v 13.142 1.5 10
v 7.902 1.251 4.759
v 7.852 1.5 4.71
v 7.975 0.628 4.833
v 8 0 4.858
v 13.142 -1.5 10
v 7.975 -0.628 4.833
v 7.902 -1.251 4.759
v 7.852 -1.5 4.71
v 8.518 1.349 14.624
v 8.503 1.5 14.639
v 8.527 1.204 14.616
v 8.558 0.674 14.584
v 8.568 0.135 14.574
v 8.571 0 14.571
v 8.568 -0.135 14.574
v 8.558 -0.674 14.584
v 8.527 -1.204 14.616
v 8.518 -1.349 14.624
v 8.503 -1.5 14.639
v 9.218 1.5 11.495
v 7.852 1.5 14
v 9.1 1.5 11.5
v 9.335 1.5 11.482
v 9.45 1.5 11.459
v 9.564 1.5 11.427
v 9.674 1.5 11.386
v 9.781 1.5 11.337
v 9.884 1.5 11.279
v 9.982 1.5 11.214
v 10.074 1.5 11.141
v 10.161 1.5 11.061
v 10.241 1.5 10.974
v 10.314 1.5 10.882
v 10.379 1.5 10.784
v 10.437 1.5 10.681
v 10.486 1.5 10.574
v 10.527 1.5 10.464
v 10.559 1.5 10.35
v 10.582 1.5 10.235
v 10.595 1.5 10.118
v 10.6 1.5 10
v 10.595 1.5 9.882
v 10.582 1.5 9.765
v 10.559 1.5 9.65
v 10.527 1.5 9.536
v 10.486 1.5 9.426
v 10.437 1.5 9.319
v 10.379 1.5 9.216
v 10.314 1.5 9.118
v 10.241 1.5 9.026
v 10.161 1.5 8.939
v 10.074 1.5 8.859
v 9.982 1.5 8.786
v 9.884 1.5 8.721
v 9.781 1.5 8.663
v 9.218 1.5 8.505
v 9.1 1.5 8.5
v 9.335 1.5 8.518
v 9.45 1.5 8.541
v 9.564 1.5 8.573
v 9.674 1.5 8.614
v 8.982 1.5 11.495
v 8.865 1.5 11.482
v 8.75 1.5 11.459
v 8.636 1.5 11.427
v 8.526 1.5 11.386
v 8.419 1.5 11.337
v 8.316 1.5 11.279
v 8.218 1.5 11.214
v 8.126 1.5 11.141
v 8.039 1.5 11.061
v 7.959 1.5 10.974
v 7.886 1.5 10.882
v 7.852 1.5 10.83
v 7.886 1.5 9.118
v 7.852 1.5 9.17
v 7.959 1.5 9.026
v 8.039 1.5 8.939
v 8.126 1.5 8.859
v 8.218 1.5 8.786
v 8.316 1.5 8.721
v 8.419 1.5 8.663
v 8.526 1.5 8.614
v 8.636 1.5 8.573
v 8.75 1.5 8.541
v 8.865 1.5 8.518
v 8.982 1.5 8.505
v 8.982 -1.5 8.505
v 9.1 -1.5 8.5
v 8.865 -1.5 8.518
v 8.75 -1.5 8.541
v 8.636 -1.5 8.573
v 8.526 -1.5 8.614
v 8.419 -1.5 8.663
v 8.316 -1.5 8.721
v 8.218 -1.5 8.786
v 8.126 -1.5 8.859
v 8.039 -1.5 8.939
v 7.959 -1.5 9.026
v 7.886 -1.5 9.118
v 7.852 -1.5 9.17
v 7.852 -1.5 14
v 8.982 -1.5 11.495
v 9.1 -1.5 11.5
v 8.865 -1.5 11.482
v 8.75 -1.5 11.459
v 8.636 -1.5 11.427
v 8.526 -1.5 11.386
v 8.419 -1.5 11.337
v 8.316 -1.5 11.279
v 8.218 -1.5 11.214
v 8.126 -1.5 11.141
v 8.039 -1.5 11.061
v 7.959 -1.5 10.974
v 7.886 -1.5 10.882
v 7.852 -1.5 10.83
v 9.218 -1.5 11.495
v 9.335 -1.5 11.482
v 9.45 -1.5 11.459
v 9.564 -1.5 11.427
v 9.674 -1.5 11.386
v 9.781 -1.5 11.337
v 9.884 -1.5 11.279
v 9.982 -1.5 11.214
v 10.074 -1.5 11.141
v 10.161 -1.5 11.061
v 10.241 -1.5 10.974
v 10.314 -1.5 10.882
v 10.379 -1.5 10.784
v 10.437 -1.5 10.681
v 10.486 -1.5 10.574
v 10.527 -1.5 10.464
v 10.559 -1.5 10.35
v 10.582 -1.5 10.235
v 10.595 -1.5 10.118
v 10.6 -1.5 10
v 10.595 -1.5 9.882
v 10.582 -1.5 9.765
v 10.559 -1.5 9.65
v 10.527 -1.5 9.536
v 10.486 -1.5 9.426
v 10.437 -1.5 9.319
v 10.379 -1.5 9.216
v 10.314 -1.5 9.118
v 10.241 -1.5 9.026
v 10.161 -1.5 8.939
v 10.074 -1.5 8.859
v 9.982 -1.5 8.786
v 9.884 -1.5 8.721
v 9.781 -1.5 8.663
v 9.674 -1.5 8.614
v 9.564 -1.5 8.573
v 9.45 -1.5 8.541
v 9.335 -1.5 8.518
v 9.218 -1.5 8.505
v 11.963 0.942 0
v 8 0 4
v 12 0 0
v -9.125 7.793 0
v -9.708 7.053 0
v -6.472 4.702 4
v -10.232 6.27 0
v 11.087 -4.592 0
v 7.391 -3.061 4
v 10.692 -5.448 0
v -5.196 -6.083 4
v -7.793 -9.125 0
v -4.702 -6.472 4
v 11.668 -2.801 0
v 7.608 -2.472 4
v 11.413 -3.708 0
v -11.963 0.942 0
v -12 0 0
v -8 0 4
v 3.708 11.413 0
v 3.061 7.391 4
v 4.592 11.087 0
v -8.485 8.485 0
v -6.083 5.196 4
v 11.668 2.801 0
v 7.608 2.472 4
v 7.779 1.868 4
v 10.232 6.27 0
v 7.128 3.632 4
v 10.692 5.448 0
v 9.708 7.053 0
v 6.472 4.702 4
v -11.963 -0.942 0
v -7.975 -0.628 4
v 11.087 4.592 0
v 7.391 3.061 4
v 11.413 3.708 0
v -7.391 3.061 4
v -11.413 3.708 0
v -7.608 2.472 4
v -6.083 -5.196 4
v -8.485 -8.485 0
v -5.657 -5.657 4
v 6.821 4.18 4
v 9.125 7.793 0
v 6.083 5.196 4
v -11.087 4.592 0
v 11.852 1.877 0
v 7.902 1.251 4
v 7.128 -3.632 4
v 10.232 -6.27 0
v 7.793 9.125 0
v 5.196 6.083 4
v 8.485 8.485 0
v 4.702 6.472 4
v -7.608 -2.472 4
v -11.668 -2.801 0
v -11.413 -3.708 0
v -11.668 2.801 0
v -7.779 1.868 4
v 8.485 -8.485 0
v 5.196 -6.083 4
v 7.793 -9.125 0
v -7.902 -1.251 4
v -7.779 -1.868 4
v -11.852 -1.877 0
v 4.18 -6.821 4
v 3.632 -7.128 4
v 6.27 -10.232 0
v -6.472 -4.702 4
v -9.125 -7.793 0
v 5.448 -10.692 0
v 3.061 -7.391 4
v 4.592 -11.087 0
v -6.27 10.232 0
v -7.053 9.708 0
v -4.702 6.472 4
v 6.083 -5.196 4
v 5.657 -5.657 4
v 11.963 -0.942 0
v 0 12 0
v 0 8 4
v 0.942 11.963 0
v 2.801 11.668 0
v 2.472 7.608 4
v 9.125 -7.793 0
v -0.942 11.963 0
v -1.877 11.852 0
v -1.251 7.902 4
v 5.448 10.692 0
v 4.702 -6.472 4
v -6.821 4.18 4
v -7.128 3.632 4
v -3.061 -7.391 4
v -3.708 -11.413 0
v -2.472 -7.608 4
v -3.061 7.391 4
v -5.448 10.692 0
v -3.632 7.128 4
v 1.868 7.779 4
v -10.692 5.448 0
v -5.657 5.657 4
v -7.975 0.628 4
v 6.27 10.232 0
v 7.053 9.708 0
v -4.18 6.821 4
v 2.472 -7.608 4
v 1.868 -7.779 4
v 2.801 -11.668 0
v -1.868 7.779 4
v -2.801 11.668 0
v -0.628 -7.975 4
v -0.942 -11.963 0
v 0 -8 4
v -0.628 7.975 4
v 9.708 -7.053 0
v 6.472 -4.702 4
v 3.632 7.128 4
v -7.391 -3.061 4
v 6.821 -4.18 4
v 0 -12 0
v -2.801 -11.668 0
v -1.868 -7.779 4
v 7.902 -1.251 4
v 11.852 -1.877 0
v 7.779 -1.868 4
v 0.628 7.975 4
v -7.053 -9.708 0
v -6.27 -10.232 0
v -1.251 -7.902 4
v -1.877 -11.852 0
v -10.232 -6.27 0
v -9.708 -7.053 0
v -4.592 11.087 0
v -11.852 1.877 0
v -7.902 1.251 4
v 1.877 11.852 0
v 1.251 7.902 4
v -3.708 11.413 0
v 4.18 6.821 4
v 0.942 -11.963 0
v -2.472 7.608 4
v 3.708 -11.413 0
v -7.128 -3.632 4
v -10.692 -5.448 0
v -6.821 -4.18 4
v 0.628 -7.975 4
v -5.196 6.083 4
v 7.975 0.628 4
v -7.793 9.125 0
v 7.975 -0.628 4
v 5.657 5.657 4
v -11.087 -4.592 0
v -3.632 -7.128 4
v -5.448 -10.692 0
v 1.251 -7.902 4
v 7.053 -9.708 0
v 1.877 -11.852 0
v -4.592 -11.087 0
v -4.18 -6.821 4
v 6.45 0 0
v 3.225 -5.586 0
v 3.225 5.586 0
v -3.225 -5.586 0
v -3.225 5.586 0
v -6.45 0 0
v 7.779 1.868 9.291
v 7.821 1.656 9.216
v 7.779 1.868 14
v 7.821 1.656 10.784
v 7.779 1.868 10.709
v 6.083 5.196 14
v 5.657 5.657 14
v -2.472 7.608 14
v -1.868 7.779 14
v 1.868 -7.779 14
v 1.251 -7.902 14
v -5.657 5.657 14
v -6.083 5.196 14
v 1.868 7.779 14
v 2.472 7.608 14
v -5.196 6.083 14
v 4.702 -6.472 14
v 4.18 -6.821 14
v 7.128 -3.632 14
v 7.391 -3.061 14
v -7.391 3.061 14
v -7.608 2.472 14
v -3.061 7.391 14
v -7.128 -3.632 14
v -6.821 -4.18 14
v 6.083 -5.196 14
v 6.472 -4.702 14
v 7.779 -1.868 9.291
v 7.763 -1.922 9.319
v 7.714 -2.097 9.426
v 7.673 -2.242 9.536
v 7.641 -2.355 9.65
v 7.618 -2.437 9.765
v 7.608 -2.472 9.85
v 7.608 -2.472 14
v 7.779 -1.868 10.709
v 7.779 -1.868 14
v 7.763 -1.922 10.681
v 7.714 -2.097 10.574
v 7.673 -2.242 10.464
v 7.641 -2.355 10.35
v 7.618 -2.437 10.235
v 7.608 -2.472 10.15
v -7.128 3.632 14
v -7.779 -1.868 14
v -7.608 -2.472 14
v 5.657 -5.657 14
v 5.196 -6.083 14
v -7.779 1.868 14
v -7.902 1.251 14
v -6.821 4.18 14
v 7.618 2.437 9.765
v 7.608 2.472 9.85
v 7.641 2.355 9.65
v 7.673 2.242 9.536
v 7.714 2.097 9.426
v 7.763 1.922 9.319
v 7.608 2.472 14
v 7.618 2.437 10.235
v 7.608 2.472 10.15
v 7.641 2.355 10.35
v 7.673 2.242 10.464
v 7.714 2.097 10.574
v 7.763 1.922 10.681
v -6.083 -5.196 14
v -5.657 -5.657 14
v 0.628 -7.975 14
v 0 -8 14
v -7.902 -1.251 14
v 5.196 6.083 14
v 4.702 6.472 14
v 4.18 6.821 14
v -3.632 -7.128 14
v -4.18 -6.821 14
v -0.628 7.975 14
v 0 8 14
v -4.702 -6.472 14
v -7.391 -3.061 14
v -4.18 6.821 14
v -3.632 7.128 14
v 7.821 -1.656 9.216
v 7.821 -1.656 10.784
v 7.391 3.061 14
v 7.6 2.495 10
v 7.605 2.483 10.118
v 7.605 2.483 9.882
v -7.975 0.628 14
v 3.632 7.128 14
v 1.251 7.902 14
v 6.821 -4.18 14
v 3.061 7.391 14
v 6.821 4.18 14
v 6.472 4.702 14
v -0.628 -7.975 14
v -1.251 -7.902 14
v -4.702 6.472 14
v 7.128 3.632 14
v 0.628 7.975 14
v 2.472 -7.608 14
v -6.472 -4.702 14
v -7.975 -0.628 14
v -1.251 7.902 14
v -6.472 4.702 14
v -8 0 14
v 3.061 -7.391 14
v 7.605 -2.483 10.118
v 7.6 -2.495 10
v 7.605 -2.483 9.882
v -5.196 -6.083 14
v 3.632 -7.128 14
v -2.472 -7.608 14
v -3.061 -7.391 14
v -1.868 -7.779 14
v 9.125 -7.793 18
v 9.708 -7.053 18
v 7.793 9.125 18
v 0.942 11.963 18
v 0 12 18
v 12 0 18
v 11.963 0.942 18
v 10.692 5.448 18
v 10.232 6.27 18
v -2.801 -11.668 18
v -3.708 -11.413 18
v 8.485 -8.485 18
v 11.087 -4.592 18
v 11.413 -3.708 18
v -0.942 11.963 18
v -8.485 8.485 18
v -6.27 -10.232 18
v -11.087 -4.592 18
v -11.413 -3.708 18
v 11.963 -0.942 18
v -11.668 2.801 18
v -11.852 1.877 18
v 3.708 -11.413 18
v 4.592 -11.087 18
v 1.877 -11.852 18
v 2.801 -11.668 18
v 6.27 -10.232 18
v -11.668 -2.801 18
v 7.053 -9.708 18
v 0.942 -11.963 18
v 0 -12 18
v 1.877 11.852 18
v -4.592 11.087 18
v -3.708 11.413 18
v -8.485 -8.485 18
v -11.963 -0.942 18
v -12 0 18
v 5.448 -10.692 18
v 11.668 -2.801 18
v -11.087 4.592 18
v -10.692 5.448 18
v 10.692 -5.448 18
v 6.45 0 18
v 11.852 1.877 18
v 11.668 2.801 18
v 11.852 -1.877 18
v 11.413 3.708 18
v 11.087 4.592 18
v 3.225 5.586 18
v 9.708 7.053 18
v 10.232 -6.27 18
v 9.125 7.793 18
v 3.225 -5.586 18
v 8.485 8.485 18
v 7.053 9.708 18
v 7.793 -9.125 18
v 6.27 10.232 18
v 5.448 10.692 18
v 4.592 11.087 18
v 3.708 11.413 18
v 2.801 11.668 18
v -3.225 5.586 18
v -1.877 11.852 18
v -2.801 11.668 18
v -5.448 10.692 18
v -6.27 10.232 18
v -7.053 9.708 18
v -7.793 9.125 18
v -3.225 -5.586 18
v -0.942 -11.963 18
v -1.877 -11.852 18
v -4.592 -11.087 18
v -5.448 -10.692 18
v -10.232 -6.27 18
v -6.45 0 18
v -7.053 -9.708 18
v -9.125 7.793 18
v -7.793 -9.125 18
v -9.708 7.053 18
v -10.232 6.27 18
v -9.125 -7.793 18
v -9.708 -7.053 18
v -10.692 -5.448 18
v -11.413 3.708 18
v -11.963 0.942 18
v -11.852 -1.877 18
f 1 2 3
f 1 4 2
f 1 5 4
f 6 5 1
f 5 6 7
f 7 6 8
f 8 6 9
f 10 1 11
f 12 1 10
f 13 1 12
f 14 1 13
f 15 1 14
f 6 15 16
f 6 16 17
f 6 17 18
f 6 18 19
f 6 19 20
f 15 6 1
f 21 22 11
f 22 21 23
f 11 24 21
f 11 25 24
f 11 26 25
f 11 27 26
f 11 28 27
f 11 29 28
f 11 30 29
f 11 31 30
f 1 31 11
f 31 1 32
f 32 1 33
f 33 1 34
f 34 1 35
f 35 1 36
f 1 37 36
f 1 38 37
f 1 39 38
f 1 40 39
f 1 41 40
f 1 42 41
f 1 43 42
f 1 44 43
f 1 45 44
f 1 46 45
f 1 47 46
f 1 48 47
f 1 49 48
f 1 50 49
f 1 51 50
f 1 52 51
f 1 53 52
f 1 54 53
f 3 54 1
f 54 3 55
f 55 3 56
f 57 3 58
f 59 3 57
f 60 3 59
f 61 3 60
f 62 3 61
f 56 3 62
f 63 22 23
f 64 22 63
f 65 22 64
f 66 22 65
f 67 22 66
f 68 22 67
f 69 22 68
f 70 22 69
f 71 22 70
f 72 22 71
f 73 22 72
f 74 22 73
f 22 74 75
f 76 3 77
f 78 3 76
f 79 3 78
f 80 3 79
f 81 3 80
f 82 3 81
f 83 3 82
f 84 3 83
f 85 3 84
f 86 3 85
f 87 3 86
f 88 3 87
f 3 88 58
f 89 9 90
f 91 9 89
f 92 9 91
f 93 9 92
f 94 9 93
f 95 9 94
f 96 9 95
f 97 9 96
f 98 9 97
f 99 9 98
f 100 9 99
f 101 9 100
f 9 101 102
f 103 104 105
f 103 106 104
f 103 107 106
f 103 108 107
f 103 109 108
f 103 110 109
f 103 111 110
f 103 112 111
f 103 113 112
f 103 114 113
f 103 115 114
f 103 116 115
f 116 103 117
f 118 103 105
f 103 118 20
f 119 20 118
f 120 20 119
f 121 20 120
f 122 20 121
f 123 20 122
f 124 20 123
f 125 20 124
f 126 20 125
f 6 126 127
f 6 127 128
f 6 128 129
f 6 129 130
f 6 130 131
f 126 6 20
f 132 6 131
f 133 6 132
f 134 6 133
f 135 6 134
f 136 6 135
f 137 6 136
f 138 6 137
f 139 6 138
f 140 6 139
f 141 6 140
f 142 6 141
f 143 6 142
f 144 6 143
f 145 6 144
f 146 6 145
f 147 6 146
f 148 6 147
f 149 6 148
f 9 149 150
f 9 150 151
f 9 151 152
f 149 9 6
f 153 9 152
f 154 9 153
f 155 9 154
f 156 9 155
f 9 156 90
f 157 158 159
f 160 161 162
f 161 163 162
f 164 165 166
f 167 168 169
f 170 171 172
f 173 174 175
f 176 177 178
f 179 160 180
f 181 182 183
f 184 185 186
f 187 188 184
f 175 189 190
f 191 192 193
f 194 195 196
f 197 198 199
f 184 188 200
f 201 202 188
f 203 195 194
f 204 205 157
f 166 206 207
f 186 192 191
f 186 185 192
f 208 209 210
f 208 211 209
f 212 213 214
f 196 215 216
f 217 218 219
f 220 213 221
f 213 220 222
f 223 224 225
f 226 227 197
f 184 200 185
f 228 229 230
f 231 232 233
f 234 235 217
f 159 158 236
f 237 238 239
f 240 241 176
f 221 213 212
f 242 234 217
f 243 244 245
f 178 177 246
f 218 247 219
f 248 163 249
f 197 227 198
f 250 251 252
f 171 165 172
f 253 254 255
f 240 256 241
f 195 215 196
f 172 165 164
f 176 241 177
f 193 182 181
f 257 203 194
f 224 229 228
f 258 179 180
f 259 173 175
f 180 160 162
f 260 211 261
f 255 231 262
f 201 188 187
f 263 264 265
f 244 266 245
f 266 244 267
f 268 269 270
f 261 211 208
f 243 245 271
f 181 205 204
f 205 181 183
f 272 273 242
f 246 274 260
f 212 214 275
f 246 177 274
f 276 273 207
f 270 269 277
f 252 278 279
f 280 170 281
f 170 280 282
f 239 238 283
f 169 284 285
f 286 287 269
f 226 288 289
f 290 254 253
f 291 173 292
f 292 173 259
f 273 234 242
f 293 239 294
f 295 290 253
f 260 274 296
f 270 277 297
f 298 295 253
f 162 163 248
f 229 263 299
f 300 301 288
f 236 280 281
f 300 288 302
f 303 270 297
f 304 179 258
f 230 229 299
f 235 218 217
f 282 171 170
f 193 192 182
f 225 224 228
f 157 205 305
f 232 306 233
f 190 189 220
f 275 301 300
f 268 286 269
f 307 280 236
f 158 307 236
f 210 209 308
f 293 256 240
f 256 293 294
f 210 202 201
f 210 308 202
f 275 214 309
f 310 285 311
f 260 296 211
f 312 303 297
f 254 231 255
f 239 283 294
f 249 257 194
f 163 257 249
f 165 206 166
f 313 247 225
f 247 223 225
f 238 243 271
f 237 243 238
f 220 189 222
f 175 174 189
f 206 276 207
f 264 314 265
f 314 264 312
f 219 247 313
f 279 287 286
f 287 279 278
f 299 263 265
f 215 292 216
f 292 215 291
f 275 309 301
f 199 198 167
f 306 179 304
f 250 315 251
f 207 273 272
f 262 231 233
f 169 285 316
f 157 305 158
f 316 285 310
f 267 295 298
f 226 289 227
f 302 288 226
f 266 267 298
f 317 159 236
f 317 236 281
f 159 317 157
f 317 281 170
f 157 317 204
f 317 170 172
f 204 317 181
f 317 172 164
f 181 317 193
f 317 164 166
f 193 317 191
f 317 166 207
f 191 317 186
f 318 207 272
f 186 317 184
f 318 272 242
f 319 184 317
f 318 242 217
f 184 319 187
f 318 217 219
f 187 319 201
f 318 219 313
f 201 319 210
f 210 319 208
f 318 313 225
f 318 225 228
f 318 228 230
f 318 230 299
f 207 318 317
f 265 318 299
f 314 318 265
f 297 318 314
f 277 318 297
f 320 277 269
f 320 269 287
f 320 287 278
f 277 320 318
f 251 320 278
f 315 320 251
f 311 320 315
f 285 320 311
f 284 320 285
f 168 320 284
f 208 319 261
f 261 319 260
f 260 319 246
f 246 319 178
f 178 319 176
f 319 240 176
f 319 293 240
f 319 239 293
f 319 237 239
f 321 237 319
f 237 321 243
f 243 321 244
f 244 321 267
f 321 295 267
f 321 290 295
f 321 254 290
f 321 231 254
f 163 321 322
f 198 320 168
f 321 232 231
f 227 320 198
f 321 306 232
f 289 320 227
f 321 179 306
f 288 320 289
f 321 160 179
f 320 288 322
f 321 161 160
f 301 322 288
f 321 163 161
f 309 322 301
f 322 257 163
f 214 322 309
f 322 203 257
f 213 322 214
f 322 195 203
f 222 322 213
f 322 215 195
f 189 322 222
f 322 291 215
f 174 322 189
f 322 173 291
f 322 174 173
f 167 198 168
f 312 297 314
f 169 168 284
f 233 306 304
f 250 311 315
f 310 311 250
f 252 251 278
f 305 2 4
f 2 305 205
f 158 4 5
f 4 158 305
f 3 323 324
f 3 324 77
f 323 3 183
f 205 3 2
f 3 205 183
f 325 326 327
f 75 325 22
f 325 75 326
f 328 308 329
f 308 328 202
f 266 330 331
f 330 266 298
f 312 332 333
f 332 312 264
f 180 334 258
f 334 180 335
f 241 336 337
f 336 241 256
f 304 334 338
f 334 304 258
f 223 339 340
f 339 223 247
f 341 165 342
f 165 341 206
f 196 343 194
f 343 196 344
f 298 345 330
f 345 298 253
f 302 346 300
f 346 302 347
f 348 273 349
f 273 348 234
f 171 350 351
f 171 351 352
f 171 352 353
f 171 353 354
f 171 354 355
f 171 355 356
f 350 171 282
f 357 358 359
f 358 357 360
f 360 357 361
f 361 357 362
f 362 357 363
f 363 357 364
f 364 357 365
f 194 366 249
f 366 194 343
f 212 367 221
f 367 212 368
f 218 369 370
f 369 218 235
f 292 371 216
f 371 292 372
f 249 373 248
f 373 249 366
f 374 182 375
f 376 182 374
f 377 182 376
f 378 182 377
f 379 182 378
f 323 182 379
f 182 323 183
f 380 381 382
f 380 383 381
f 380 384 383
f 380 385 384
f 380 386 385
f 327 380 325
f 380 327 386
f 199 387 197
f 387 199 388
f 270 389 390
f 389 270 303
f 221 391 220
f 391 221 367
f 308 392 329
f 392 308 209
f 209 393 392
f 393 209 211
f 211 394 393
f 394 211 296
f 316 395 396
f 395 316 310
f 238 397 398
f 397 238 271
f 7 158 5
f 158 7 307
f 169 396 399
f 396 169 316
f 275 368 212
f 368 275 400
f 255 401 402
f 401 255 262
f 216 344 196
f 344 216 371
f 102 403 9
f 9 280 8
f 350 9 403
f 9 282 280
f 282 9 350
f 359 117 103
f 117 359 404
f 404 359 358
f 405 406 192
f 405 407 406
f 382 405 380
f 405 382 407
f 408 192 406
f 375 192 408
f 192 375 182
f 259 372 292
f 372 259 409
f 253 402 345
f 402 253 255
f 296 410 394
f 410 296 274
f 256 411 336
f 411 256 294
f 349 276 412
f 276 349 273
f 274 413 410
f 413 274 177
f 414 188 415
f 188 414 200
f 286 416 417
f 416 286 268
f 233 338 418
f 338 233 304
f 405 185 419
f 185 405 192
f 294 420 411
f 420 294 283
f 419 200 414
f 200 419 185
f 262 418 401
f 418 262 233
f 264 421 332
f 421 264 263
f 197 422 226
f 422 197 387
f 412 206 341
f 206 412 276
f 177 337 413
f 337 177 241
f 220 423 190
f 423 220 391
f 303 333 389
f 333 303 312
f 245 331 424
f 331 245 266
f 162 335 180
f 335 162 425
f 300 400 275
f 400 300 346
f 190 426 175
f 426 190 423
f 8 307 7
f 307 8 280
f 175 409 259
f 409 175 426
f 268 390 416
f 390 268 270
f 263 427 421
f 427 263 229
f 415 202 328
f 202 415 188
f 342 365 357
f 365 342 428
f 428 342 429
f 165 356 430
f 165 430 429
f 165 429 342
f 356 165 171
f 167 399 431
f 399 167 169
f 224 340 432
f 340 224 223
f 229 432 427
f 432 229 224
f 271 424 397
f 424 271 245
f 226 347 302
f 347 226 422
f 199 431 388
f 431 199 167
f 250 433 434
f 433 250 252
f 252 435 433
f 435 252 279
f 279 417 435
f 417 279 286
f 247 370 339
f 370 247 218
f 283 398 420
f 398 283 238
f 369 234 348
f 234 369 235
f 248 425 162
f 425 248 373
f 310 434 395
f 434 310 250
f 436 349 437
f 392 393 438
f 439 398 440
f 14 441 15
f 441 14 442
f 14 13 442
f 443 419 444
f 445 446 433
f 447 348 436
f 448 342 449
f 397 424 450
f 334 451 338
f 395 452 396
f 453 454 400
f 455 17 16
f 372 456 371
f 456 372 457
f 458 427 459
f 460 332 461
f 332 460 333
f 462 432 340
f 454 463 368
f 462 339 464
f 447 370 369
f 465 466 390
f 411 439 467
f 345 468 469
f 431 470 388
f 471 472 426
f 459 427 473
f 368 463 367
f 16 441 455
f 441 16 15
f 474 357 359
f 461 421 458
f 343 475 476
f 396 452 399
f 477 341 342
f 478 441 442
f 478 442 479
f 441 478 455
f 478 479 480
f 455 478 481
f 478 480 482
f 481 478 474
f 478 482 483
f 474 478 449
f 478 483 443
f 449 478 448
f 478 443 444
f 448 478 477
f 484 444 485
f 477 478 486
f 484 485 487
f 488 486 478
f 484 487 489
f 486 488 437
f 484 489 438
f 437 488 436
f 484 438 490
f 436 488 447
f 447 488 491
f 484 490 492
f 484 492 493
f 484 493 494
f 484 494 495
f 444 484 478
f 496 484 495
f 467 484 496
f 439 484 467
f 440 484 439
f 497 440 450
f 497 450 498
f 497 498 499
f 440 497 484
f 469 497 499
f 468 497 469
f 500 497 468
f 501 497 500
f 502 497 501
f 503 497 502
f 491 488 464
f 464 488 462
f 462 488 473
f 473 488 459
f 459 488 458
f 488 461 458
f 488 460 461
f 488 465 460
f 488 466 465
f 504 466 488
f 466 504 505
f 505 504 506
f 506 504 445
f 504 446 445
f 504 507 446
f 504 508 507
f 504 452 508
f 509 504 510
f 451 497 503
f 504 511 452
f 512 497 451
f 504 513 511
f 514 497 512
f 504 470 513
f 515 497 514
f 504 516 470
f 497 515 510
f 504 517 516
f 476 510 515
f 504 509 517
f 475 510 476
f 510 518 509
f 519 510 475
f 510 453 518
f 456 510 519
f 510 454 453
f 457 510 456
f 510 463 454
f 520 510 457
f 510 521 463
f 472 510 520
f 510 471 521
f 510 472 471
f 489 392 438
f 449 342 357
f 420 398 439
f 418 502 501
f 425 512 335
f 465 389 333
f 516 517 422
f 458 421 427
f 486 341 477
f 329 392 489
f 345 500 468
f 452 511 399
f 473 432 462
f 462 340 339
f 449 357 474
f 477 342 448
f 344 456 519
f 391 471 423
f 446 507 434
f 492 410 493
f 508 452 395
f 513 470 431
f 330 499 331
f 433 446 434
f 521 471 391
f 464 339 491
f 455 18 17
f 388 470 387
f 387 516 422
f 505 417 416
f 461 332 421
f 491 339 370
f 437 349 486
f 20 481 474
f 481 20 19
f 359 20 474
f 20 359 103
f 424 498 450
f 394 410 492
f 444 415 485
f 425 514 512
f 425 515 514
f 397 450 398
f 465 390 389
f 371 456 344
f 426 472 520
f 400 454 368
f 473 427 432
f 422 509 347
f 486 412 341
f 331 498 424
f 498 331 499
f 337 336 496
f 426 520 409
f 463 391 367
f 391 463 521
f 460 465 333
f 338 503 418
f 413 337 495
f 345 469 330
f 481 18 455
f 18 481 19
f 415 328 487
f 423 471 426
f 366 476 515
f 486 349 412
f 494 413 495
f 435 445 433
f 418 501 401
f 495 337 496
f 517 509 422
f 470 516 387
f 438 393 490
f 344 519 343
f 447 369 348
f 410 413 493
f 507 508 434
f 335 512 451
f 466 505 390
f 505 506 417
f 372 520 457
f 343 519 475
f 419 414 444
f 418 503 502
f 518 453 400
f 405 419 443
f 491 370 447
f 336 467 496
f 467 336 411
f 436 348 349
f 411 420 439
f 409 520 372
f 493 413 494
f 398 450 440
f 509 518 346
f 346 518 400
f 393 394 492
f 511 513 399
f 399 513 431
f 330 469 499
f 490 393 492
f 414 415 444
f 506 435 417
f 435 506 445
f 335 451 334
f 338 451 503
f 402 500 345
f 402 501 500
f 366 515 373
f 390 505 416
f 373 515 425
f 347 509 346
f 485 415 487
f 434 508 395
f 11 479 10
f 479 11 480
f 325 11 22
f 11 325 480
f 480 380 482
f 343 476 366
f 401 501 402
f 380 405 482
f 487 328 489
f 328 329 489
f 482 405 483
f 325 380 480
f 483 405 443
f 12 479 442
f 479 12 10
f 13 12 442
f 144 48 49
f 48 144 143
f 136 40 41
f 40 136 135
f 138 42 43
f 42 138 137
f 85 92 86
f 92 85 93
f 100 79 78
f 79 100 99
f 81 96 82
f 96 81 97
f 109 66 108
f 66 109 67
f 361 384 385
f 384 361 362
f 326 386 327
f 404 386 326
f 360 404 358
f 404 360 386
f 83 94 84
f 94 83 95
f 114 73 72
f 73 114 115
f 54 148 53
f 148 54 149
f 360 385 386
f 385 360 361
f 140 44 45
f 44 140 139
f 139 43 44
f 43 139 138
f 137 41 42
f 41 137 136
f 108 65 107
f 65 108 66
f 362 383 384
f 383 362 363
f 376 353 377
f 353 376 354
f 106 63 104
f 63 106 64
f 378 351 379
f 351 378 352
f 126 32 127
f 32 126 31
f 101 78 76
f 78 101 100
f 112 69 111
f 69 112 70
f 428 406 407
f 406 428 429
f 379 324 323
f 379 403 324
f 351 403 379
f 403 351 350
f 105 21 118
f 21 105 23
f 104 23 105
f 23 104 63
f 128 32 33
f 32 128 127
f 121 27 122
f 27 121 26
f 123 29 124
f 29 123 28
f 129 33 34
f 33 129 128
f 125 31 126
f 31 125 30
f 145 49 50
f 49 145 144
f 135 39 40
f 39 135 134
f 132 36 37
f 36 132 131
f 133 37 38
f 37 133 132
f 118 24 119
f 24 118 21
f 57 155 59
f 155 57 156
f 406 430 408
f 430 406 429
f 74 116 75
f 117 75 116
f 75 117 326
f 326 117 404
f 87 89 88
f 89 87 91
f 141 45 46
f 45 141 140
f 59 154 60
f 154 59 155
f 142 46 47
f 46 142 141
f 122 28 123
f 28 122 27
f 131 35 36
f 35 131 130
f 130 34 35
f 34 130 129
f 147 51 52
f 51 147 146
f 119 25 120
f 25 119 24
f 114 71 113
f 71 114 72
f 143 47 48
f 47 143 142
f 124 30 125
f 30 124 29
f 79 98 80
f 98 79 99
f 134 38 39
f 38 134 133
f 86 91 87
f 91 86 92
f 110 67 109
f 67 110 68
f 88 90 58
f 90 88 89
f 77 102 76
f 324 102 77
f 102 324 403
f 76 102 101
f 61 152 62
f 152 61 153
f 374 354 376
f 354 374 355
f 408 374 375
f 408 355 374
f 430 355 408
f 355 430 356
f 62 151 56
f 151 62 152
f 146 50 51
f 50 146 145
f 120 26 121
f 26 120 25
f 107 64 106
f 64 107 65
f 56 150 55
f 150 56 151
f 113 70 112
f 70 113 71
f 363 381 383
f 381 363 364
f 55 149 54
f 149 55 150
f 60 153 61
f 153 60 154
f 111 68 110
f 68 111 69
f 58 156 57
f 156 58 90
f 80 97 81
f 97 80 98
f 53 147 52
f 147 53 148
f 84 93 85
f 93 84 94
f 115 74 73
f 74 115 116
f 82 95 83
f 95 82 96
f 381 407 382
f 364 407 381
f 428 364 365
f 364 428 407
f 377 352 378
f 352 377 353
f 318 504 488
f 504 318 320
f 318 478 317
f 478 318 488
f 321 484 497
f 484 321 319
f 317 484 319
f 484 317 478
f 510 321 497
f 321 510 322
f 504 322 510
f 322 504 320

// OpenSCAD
// file: inc/constants.scad
pi=3.1415;
$fn=80;
//hole radius
hr = 6;

//distance between holes
dh = 12;

//x distance between holes
dhx = 12;

//y distance between holes
dhy = 14.4;

//give between two gears
giveg = .5;

//shaft give
sgive = .6;

//plug give
pgive = .15;

//fastener give (holes)
fgive = .13;

pitch=.25;

//gear give (hole)
ggive = .45;

//spacer give
spgive = .3;


////fastener sizes
//notch width
notchw = 0;

//notch height
notchh = 0;

//fastener height
fh = 4;

//fastener width (sans notch)
fw = hr;


//gear hole radius
ghr = 1.4;

//arrow length
al = 8;


//give for the nut
nut_give = .8;
// main file
include <inc/constants.scad>


module pulley(rad=hr*3, thickness=10, flange_height=4, flange_width=4, square=false)
{
  difference()
  {
  union()
  {


    //thread holder
    translate([-1,-1.5,thickness/2+5])
    rotate([0,45,0])
    cube([10,3,10]);

    

  cylinder(r2=rad, r1=rad+flange_height, h=flange_width);
  translate([0,0,flange_width])
  cylinder(r=rad, h=thickness);
  translate([0,0,flange_width+thickness])
  cylinder(r1=rad, r2=rad+flange_height, h=flange_width);
  }


translate([rad+1.1,5,thickness/2+5])
    rotate([90,0,0])
    cylinder(r=1.5, h=10);


  translate([0,0,-1])
  if(square)
    cylinder(r=hr+ggive, h=thickness+flange_width*2+2, $fn=6);
  else
    cylinder(r=hr+pgive, h=thickness+flange_width*2+2);
}


}

pulley(square=true, rad=hr+2);
